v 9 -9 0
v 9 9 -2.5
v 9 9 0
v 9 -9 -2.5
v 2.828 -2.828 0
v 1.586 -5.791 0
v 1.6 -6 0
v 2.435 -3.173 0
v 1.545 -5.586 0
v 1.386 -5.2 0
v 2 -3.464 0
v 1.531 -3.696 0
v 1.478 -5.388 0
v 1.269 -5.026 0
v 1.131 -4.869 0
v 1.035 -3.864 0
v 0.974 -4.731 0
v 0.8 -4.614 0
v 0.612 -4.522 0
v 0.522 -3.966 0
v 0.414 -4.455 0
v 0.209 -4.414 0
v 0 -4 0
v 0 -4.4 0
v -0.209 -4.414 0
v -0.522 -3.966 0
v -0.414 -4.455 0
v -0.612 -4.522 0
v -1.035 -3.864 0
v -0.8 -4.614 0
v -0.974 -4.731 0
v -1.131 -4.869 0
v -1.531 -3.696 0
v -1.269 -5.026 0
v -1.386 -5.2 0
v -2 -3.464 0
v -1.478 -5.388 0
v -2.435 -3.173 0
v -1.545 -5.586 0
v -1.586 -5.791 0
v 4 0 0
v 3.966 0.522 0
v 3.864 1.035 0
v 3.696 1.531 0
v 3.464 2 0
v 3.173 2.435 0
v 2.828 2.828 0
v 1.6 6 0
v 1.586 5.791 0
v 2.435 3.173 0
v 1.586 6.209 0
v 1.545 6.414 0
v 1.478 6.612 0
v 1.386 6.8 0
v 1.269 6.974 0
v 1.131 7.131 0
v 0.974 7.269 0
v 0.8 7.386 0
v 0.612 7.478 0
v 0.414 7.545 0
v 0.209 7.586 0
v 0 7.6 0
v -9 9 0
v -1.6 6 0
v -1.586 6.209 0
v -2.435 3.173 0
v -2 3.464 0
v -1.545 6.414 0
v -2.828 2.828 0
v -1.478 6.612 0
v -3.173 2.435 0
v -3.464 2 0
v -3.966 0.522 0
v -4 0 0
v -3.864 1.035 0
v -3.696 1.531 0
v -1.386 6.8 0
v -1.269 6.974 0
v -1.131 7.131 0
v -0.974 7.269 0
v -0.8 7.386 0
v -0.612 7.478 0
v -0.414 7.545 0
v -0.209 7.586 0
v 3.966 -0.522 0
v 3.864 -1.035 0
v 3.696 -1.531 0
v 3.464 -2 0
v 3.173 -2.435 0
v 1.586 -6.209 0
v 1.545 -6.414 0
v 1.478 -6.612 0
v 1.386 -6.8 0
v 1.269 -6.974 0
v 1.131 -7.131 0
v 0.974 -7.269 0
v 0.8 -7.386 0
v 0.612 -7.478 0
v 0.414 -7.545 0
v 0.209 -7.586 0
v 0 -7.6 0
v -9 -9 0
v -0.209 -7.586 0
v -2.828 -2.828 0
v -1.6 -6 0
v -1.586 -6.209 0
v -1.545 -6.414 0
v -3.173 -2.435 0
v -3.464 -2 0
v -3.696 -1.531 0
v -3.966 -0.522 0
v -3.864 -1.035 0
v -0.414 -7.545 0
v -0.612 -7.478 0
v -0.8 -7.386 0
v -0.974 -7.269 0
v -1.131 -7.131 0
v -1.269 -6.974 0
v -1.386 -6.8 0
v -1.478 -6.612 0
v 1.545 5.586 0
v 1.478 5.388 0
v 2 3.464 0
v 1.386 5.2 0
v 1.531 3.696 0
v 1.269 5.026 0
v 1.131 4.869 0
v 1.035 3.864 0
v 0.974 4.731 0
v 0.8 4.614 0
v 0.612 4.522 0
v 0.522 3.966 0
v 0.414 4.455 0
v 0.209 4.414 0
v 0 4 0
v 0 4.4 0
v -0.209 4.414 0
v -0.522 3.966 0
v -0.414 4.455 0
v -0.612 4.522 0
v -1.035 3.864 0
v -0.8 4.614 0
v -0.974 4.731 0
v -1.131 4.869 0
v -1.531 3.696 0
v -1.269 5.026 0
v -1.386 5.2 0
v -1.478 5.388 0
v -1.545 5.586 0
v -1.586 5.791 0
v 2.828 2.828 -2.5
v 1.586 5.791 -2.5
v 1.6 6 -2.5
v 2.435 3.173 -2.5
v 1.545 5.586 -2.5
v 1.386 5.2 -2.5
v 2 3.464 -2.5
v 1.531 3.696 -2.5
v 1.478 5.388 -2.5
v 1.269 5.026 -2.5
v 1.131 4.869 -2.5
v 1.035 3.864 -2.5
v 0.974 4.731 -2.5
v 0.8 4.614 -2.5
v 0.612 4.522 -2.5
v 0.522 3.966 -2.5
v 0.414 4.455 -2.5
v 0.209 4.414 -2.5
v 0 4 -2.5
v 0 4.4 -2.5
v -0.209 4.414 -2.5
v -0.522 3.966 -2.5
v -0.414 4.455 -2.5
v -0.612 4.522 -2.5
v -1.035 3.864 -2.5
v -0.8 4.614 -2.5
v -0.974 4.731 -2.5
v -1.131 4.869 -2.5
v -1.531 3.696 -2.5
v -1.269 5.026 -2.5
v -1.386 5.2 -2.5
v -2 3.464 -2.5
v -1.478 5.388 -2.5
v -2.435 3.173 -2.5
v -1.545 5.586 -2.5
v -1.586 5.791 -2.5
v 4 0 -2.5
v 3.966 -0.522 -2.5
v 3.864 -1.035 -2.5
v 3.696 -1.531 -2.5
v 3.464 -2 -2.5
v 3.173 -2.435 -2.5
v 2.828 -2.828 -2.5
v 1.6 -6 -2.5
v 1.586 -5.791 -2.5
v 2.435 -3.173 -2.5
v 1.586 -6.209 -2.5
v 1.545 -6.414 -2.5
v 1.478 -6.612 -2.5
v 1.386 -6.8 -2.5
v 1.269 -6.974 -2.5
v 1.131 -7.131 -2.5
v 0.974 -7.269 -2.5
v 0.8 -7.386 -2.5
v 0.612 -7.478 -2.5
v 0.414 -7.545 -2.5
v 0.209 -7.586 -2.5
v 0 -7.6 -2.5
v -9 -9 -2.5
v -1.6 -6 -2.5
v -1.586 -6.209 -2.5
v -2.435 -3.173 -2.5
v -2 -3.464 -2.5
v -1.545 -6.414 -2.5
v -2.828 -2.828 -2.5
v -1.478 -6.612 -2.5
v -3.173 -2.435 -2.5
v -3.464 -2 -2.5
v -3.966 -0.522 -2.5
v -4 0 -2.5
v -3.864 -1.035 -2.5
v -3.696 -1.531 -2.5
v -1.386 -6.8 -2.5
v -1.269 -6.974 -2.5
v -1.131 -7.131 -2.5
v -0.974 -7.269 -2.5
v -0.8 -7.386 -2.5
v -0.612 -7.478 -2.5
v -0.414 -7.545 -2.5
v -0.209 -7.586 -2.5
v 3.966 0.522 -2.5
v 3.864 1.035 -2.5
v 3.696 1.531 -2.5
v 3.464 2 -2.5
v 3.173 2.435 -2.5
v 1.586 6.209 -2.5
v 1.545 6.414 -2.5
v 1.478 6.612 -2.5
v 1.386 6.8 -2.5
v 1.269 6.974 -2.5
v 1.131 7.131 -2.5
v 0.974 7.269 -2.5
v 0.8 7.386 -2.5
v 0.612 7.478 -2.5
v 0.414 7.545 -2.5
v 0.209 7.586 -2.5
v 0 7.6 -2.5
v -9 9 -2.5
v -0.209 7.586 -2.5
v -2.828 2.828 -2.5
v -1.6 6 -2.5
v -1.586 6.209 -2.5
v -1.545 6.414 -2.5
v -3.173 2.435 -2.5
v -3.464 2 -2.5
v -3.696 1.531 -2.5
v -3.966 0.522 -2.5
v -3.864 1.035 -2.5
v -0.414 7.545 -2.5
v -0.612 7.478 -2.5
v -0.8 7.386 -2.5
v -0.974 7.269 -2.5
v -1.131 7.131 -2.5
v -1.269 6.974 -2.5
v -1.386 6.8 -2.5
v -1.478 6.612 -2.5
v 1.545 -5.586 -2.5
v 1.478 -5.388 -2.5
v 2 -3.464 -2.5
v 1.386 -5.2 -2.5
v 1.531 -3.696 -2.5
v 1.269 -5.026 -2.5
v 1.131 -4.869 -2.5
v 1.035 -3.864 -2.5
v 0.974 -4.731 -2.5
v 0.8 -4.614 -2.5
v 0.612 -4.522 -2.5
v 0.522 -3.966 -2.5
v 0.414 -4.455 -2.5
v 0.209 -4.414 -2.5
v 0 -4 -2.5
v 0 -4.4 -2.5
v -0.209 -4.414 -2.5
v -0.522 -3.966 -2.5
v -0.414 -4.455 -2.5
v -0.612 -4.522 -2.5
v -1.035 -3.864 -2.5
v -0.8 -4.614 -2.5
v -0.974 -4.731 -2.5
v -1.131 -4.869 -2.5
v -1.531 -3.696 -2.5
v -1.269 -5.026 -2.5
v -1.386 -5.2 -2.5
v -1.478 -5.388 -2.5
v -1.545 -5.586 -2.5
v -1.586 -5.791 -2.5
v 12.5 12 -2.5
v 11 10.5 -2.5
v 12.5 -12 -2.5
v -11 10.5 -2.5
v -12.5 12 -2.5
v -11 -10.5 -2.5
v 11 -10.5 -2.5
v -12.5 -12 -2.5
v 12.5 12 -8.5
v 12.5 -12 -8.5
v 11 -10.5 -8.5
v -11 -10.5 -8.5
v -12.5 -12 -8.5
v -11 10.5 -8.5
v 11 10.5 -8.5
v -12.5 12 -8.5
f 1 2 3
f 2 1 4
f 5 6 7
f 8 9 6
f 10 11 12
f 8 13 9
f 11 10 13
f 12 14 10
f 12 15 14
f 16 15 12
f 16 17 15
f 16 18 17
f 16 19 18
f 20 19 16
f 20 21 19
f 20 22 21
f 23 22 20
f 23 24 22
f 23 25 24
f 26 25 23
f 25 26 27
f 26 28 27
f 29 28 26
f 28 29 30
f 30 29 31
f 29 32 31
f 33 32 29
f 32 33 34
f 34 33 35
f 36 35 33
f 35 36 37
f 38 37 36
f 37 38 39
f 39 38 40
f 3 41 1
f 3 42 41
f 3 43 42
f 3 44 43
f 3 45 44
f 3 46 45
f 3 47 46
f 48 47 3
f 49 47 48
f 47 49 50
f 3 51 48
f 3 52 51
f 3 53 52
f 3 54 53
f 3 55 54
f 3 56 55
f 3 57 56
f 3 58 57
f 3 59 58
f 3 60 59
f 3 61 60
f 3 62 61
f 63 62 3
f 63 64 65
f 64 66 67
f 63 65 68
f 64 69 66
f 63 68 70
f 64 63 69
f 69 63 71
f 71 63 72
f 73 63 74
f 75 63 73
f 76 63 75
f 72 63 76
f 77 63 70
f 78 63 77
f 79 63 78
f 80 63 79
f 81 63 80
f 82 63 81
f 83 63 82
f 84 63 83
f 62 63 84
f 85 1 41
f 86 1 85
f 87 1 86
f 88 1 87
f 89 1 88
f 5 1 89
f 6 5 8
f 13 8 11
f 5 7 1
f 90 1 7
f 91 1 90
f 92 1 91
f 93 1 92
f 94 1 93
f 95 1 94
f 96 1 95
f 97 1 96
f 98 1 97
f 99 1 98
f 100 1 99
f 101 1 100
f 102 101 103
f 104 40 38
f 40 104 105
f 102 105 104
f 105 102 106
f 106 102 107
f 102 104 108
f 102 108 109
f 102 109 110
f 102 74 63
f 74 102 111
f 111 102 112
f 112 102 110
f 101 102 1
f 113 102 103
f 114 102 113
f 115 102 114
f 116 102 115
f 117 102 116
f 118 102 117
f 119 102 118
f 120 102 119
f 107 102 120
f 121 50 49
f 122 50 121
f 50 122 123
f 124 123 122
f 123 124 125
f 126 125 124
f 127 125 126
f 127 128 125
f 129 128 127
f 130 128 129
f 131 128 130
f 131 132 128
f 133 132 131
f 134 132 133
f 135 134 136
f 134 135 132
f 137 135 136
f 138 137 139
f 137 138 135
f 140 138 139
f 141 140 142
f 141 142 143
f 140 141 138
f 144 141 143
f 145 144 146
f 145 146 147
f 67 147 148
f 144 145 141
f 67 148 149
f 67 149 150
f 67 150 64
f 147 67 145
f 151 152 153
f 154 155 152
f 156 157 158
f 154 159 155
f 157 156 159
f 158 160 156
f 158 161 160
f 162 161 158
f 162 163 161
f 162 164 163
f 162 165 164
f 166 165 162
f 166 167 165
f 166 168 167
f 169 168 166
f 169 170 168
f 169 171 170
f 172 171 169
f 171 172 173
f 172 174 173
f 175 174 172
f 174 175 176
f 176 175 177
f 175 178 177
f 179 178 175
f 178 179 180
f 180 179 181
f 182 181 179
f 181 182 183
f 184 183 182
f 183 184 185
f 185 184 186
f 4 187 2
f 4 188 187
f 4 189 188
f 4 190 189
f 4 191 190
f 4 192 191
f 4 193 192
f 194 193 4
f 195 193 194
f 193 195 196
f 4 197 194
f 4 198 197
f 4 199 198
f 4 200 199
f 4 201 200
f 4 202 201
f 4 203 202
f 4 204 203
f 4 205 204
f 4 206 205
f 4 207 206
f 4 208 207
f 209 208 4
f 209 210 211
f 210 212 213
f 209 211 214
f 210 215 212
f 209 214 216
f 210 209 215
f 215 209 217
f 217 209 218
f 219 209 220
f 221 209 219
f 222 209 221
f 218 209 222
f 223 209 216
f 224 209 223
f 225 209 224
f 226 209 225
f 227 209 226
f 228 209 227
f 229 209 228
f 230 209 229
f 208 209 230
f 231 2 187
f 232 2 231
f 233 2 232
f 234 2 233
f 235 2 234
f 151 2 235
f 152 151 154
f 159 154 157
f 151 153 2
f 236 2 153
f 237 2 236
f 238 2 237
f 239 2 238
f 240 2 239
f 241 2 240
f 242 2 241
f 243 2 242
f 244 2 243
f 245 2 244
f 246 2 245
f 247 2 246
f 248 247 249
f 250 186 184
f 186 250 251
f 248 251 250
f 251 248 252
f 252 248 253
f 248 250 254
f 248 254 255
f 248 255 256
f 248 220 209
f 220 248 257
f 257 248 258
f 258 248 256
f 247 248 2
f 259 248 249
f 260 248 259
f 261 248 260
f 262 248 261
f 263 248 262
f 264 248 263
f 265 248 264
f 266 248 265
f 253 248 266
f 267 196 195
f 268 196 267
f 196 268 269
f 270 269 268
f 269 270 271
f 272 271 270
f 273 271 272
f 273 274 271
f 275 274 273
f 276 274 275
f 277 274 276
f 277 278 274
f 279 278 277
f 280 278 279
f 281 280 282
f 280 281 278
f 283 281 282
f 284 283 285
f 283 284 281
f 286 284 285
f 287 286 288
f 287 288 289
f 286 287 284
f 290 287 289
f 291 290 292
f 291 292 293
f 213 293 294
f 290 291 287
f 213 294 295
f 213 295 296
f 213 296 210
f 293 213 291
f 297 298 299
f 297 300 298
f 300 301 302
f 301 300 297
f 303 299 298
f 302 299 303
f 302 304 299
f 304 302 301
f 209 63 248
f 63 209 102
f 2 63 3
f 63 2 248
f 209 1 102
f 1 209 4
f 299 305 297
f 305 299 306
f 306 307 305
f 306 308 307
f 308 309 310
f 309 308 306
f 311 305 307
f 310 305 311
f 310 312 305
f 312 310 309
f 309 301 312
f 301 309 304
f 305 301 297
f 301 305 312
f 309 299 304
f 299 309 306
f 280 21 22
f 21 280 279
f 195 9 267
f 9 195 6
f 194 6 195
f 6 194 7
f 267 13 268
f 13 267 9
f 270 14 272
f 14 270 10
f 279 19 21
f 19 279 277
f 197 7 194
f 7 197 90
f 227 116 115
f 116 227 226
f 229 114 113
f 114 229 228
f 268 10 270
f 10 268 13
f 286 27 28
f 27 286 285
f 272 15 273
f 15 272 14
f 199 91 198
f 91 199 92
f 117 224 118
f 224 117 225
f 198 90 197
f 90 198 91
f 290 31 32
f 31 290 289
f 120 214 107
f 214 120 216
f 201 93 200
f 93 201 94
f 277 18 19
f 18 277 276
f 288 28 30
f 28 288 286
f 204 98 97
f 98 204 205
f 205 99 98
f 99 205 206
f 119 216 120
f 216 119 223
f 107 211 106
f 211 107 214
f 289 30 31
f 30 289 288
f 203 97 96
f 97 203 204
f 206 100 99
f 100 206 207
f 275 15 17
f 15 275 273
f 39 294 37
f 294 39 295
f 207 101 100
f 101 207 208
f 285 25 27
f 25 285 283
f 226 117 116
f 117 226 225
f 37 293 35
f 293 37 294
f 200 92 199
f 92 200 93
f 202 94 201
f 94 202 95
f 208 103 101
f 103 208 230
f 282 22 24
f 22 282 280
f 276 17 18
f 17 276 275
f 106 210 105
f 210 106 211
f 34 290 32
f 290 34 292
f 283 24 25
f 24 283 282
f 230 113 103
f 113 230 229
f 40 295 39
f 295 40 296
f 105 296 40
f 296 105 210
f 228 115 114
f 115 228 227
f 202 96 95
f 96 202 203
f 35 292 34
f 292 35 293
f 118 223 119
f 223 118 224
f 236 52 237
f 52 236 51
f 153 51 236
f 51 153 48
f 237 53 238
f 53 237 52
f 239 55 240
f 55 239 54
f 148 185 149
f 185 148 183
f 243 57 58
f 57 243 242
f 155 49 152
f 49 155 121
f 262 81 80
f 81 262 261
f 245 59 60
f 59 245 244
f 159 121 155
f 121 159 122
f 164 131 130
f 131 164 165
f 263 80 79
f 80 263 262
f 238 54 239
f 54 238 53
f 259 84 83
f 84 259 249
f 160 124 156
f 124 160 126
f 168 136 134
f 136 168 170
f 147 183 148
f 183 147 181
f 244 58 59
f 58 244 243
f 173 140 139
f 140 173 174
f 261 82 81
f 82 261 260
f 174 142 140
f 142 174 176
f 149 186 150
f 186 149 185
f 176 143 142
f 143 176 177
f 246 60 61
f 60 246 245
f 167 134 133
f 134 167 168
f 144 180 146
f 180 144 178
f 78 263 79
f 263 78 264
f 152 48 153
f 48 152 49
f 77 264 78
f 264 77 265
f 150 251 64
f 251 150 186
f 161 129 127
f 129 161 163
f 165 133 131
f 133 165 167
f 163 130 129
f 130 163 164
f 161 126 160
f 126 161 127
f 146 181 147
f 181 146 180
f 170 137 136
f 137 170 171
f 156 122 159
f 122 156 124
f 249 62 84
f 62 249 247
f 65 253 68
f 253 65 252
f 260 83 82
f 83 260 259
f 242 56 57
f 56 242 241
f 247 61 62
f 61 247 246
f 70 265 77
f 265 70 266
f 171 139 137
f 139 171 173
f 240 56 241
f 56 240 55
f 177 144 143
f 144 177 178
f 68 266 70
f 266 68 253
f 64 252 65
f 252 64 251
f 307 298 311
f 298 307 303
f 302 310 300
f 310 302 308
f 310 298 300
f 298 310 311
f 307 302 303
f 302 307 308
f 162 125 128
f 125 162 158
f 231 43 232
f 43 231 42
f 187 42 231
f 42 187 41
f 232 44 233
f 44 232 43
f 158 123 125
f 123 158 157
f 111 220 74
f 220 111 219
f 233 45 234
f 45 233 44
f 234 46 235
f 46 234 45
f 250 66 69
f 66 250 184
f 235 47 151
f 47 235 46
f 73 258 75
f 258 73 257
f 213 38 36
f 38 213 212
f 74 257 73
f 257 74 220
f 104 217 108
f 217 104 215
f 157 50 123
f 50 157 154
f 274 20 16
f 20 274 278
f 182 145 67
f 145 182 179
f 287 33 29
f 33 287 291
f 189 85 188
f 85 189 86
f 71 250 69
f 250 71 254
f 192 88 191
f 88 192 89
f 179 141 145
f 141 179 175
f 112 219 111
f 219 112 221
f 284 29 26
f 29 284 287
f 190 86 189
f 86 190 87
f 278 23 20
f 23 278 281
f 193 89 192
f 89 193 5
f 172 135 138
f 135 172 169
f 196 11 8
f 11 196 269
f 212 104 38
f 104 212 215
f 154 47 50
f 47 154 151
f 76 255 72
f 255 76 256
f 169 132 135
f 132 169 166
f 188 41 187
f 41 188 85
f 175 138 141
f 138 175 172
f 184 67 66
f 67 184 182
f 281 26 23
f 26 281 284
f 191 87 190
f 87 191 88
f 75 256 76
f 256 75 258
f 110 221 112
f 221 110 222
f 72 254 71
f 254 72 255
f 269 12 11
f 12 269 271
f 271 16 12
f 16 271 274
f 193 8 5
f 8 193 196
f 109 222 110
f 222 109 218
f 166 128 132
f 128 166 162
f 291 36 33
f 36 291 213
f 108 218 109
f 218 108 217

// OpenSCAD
// file: cad_config.scad
// Shared dimensions for the reference toolhead, in millimetres.
//
// These constants are mirrored by `constants:` in cad/manifest.yaml and
// by the collision primitives in steropes/gantry.py — the drift guard in
// tests/test_cadimport.py fails if any of the three diverge.

CARRIAGE_W = 40;                    // X width  (2 * gantry.CARRIAGE_HALF_MM[0])
CARRIAGE_D = 40;                    // Y depth  (2 * gantry.CARRIAGE_HALF_MM[1])
CARRIAGE_H = 20;                    // Z height (2 * gantry.CARRIAGE_HALF_MM[2])

FINGER_DIA = 8;                     // plunger shaft Ø (2 * gantry.FINGER_RADIUS_MM)
FINGER_LEN = 30;                    // shaft length (2 * gantry.FINGER_HALF_LEN_MM)
FINGER_OFFSET = [12, 0, -25];       // toolhead frame (gantry.FINGER_OFFSET_MM)
TOOLCAM_OFFSET = [-12, 0, -11];     // toolhead frame (gantry.TOOLCAM_OFFSET_MM)

M3_CLEAR = 3.2;                     // M3 clearance hole

SERVO_W = 23;                       // 9 g servo body, for the carriage pocket
SERVO_D = 12.5;
SERVO_H = 8;

$fn = 48;
// main file
// Toolcam bracket: hangs the downward toolhead camera off the carriage.
// Local frame: origin at the bracket's top-face centre — the manifest
// places the mesh at gantry.TOOLCAM_OFFSET_MM in the toolhead frame —
// Z up (parts extend toward -Z, below the carriage).
//
// Export: openscad -o toolcam_bracket.stl -D 'PART="toolcam_bracket"' toolcam_bracket.scad
include <cad_config.scad>

PART = "preview";

PLATE_T = 2.5;        // top plate thickness
CAM_W = 25;           // camera module outline
CAM_D = 24;
CAM_POCKET_H = 6;

module toolcam_bracket() {
    difference() {
        union() {
            // horizontal plate against the carriage underside (top face z=0)
            translate([0, 0, -PLATE_T / 2])
                cube([18, 18, PLATE_T], center = true);
            // camera cradle hanging below the plate
            translate([0, 0, -PLATE_T - CAM_POCKET_H / 2])
                cube([CAM_W, CAM_D, CAM_POCKET_H], center = true);
        }
        // camera pocket, open at the bottom
        translate([0, 0, -PLATE_T - CAM_POCKET_H / 2 - 1])
            cube([CAM_W - 3, CAM_D - 3, CAM_POCKET_H + 2], center = true);
        // lens bore straight through plate and cradle
        translate([0, 0, -PLATE_T - CAM_POCKET_H / 2])
            cylinder(d = 8, h = 3 * (PLATE_T + CAM_POCKET_H), center = true);
        // 2x M3 mounting holes through the top plate
        for (sy = [-1, 1])
            translate([0, sy * 6, -PLATE_T / 2])
                cylinder(d = M3_CLEAR, h = PLATE_T + 2, center = true);
    }
}

if (PART == "preview" || PART == "toolcam_bracket")
    toolcam_bracket();
